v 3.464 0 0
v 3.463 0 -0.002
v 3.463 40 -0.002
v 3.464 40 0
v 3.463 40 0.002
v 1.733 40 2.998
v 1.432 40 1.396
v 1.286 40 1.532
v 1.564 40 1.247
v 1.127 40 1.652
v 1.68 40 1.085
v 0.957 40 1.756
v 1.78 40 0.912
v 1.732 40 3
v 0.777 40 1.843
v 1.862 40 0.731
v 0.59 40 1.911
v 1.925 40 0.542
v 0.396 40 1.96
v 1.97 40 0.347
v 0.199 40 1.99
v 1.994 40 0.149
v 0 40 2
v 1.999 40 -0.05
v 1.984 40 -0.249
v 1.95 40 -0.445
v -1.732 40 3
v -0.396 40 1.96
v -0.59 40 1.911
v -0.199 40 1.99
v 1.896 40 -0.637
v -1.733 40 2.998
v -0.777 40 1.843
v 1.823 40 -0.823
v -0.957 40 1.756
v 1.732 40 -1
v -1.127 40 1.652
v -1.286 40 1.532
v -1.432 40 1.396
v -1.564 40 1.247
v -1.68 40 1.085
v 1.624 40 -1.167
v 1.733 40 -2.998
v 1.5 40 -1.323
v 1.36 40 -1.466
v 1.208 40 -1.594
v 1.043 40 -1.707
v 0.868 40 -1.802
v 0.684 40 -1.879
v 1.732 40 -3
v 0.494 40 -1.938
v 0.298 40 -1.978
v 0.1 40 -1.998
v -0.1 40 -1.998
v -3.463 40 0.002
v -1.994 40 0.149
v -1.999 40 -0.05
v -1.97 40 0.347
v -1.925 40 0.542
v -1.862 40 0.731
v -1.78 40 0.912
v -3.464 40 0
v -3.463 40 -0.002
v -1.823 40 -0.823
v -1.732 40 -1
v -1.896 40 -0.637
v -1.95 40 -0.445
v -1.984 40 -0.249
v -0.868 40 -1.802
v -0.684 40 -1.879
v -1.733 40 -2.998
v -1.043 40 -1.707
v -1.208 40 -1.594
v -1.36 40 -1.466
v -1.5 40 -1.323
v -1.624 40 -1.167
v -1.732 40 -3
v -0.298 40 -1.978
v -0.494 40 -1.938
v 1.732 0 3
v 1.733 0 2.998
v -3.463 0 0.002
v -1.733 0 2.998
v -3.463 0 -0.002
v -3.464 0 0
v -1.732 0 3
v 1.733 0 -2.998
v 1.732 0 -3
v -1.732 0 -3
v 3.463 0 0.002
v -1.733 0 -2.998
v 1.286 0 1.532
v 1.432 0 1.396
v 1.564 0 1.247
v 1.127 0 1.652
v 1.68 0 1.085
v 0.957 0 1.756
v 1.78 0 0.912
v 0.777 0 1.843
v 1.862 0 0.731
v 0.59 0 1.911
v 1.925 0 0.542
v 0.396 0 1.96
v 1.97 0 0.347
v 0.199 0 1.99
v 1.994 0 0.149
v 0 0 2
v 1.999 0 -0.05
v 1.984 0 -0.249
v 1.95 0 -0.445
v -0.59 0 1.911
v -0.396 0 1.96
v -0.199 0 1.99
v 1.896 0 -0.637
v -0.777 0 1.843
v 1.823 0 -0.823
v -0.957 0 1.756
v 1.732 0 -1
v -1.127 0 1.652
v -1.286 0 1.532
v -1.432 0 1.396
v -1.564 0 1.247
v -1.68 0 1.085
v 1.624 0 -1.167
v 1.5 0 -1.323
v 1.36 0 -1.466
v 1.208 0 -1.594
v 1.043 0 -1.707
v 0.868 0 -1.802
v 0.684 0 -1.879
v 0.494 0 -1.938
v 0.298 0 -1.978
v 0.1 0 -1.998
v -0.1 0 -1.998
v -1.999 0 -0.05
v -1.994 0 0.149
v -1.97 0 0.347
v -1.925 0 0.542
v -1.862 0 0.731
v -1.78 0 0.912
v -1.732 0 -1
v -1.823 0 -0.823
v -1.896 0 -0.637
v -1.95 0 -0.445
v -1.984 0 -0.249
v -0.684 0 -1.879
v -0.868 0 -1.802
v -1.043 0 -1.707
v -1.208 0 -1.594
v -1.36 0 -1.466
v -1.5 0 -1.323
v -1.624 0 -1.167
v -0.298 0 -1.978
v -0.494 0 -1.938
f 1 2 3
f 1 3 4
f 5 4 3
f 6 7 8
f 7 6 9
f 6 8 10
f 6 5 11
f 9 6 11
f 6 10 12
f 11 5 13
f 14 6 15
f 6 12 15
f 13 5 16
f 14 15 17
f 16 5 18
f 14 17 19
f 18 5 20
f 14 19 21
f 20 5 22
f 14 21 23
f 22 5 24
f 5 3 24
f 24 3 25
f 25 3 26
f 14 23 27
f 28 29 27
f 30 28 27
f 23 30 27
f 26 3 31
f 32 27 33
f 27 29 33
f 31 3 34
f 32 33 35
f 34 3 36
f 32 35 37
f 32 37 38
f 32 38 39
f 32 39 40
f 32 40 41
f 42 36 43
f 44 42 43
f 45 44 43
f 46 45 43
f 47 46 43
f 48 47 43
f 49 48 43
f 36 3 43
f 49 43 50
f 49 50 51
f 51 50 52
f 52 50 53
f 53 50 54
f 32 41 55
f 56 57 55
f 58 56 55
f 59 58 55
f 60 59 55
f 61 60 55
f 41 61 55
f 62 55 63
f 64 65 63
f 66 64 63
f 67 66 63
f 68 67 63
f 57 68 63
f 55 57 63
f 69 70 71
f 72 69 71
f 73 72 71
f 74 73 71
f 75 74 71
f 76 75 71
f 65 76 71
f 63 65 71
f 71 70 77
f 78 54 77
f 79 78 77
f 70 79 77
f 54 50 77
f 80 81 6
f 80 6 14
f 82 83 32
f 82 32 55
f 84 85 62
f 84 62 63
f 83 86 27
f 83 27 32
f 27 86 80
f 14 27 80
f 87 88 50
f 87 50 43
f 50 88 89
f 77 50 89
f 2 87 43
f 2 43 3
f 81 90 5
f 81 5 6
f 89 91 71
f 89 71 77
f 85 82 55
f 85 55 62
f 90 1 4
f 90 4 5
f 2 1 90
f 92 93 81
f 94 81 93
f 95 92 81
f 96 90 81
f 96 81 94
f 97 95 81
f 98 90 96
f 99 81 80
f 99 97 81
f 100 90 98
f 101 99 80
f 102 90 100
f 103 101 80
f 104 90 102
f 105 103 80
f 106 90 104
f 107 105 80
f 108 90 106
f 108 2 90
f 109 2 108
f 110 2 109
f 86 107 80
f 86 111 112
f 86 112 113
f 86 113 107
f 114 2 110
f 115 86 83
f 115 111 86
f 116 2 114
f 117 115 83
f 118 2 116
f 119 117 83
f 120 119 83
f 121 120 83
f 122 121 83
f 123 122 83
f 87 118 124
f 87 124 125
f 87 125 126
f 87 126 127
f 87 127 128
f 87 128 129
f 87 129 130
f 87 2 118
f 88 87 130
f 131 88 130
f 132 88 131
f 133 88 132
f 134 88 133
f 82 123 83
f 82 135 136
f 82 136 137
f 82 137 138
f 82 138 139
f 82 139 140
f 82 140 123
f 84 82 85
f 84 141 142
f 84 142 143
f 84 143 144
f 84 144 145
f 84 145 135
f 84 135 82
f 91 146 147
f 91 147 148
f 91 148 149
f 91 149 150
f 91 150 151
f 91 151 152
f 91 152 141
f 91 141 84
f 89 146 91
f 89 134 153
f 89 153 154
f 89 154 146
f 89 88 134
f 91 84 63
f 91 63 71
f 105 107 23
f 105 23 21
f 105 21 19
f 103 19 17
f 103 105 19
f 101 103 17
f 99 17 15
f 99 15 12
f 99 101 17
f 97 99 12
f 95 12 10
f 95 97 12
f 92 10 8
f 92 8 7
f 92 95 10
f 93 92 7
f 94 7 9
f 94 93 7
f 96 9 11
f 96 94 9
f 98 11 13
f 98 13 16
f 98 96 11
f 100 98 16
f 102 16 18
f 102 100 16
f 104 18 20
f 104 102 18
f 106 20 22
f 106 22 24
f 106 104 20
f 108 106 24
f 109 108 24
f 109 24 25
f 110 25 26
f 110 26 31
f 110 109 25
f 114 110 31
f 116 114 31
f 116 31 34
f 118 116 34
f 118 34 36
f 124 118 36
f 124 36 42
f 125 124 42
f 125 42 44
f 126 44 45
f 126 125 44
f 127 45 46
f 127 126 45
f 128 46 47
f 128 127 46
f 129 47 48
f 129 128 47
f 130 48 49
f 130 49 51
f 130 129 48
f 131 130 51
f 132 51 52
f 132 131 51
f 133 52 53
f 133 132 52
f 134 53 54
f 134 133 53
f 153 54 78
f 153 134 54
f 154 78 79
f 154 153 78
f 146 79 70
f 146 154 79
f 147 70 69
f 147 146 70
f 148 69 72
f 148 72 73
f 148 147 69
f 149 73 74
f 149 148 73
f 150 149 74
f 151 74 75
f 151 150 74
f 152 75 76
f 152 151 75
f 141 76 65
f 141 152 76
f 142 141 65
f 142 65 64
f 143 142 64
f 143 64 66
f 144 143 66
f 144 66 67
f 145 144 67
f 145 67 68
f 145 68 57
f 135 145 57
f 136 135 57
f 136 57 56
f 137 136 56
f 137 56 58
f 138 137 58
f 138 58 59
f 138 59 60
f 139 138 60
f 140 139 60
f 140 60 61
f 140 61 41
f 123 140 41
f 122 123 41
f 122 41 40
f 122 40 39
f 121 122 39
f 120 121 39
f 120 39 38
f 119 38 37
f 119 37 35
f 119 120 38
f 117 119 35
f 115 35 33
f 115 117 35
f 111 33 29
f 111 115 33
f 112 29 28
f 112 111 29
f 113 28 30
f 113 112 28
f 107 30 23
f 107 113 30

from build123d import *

# Parameters (mm, degrees)
SKETCH_1_R      = 2
EXTRUDE_2_DEPTH = 40


with BuildPart() as part:
    # 草图1 → 凸台-拉伸2 (new body)
    with BuildSketch(Plane(origin=(0, 0, 0), x_dir=(1, 0, 0), z_dir=(0, 1, 0))):
        Polygon((-1.73, 3), (1.73, 3), (1.732050808, 3), (1.733076211, 2.998223949), (3.463076211, 0.001776051), (3.464101615, 0), (3.463076211, -0.001776051), (1.733076211, -2.998223949), (1.732050808, -3), (1.73, -3), (-1.73, -3), (-1.732050808, -3), (-1.733076211, -2.998223949), (-3.463076211, -0.001776051), (-3.464101615, 0), (-3.463076211, 0.001776051), (-1.733076211, 2.998223949), (-1.732050808, 3), align=None)
        with Locations(Location((0, 0, 0), (0, 0, 270))):
            Circle(SKETCH_1_R, mode=Mode.SUBTRACT)
    extrude(amount=EXTRUDE_2_DEPTH)


solid = part.part
